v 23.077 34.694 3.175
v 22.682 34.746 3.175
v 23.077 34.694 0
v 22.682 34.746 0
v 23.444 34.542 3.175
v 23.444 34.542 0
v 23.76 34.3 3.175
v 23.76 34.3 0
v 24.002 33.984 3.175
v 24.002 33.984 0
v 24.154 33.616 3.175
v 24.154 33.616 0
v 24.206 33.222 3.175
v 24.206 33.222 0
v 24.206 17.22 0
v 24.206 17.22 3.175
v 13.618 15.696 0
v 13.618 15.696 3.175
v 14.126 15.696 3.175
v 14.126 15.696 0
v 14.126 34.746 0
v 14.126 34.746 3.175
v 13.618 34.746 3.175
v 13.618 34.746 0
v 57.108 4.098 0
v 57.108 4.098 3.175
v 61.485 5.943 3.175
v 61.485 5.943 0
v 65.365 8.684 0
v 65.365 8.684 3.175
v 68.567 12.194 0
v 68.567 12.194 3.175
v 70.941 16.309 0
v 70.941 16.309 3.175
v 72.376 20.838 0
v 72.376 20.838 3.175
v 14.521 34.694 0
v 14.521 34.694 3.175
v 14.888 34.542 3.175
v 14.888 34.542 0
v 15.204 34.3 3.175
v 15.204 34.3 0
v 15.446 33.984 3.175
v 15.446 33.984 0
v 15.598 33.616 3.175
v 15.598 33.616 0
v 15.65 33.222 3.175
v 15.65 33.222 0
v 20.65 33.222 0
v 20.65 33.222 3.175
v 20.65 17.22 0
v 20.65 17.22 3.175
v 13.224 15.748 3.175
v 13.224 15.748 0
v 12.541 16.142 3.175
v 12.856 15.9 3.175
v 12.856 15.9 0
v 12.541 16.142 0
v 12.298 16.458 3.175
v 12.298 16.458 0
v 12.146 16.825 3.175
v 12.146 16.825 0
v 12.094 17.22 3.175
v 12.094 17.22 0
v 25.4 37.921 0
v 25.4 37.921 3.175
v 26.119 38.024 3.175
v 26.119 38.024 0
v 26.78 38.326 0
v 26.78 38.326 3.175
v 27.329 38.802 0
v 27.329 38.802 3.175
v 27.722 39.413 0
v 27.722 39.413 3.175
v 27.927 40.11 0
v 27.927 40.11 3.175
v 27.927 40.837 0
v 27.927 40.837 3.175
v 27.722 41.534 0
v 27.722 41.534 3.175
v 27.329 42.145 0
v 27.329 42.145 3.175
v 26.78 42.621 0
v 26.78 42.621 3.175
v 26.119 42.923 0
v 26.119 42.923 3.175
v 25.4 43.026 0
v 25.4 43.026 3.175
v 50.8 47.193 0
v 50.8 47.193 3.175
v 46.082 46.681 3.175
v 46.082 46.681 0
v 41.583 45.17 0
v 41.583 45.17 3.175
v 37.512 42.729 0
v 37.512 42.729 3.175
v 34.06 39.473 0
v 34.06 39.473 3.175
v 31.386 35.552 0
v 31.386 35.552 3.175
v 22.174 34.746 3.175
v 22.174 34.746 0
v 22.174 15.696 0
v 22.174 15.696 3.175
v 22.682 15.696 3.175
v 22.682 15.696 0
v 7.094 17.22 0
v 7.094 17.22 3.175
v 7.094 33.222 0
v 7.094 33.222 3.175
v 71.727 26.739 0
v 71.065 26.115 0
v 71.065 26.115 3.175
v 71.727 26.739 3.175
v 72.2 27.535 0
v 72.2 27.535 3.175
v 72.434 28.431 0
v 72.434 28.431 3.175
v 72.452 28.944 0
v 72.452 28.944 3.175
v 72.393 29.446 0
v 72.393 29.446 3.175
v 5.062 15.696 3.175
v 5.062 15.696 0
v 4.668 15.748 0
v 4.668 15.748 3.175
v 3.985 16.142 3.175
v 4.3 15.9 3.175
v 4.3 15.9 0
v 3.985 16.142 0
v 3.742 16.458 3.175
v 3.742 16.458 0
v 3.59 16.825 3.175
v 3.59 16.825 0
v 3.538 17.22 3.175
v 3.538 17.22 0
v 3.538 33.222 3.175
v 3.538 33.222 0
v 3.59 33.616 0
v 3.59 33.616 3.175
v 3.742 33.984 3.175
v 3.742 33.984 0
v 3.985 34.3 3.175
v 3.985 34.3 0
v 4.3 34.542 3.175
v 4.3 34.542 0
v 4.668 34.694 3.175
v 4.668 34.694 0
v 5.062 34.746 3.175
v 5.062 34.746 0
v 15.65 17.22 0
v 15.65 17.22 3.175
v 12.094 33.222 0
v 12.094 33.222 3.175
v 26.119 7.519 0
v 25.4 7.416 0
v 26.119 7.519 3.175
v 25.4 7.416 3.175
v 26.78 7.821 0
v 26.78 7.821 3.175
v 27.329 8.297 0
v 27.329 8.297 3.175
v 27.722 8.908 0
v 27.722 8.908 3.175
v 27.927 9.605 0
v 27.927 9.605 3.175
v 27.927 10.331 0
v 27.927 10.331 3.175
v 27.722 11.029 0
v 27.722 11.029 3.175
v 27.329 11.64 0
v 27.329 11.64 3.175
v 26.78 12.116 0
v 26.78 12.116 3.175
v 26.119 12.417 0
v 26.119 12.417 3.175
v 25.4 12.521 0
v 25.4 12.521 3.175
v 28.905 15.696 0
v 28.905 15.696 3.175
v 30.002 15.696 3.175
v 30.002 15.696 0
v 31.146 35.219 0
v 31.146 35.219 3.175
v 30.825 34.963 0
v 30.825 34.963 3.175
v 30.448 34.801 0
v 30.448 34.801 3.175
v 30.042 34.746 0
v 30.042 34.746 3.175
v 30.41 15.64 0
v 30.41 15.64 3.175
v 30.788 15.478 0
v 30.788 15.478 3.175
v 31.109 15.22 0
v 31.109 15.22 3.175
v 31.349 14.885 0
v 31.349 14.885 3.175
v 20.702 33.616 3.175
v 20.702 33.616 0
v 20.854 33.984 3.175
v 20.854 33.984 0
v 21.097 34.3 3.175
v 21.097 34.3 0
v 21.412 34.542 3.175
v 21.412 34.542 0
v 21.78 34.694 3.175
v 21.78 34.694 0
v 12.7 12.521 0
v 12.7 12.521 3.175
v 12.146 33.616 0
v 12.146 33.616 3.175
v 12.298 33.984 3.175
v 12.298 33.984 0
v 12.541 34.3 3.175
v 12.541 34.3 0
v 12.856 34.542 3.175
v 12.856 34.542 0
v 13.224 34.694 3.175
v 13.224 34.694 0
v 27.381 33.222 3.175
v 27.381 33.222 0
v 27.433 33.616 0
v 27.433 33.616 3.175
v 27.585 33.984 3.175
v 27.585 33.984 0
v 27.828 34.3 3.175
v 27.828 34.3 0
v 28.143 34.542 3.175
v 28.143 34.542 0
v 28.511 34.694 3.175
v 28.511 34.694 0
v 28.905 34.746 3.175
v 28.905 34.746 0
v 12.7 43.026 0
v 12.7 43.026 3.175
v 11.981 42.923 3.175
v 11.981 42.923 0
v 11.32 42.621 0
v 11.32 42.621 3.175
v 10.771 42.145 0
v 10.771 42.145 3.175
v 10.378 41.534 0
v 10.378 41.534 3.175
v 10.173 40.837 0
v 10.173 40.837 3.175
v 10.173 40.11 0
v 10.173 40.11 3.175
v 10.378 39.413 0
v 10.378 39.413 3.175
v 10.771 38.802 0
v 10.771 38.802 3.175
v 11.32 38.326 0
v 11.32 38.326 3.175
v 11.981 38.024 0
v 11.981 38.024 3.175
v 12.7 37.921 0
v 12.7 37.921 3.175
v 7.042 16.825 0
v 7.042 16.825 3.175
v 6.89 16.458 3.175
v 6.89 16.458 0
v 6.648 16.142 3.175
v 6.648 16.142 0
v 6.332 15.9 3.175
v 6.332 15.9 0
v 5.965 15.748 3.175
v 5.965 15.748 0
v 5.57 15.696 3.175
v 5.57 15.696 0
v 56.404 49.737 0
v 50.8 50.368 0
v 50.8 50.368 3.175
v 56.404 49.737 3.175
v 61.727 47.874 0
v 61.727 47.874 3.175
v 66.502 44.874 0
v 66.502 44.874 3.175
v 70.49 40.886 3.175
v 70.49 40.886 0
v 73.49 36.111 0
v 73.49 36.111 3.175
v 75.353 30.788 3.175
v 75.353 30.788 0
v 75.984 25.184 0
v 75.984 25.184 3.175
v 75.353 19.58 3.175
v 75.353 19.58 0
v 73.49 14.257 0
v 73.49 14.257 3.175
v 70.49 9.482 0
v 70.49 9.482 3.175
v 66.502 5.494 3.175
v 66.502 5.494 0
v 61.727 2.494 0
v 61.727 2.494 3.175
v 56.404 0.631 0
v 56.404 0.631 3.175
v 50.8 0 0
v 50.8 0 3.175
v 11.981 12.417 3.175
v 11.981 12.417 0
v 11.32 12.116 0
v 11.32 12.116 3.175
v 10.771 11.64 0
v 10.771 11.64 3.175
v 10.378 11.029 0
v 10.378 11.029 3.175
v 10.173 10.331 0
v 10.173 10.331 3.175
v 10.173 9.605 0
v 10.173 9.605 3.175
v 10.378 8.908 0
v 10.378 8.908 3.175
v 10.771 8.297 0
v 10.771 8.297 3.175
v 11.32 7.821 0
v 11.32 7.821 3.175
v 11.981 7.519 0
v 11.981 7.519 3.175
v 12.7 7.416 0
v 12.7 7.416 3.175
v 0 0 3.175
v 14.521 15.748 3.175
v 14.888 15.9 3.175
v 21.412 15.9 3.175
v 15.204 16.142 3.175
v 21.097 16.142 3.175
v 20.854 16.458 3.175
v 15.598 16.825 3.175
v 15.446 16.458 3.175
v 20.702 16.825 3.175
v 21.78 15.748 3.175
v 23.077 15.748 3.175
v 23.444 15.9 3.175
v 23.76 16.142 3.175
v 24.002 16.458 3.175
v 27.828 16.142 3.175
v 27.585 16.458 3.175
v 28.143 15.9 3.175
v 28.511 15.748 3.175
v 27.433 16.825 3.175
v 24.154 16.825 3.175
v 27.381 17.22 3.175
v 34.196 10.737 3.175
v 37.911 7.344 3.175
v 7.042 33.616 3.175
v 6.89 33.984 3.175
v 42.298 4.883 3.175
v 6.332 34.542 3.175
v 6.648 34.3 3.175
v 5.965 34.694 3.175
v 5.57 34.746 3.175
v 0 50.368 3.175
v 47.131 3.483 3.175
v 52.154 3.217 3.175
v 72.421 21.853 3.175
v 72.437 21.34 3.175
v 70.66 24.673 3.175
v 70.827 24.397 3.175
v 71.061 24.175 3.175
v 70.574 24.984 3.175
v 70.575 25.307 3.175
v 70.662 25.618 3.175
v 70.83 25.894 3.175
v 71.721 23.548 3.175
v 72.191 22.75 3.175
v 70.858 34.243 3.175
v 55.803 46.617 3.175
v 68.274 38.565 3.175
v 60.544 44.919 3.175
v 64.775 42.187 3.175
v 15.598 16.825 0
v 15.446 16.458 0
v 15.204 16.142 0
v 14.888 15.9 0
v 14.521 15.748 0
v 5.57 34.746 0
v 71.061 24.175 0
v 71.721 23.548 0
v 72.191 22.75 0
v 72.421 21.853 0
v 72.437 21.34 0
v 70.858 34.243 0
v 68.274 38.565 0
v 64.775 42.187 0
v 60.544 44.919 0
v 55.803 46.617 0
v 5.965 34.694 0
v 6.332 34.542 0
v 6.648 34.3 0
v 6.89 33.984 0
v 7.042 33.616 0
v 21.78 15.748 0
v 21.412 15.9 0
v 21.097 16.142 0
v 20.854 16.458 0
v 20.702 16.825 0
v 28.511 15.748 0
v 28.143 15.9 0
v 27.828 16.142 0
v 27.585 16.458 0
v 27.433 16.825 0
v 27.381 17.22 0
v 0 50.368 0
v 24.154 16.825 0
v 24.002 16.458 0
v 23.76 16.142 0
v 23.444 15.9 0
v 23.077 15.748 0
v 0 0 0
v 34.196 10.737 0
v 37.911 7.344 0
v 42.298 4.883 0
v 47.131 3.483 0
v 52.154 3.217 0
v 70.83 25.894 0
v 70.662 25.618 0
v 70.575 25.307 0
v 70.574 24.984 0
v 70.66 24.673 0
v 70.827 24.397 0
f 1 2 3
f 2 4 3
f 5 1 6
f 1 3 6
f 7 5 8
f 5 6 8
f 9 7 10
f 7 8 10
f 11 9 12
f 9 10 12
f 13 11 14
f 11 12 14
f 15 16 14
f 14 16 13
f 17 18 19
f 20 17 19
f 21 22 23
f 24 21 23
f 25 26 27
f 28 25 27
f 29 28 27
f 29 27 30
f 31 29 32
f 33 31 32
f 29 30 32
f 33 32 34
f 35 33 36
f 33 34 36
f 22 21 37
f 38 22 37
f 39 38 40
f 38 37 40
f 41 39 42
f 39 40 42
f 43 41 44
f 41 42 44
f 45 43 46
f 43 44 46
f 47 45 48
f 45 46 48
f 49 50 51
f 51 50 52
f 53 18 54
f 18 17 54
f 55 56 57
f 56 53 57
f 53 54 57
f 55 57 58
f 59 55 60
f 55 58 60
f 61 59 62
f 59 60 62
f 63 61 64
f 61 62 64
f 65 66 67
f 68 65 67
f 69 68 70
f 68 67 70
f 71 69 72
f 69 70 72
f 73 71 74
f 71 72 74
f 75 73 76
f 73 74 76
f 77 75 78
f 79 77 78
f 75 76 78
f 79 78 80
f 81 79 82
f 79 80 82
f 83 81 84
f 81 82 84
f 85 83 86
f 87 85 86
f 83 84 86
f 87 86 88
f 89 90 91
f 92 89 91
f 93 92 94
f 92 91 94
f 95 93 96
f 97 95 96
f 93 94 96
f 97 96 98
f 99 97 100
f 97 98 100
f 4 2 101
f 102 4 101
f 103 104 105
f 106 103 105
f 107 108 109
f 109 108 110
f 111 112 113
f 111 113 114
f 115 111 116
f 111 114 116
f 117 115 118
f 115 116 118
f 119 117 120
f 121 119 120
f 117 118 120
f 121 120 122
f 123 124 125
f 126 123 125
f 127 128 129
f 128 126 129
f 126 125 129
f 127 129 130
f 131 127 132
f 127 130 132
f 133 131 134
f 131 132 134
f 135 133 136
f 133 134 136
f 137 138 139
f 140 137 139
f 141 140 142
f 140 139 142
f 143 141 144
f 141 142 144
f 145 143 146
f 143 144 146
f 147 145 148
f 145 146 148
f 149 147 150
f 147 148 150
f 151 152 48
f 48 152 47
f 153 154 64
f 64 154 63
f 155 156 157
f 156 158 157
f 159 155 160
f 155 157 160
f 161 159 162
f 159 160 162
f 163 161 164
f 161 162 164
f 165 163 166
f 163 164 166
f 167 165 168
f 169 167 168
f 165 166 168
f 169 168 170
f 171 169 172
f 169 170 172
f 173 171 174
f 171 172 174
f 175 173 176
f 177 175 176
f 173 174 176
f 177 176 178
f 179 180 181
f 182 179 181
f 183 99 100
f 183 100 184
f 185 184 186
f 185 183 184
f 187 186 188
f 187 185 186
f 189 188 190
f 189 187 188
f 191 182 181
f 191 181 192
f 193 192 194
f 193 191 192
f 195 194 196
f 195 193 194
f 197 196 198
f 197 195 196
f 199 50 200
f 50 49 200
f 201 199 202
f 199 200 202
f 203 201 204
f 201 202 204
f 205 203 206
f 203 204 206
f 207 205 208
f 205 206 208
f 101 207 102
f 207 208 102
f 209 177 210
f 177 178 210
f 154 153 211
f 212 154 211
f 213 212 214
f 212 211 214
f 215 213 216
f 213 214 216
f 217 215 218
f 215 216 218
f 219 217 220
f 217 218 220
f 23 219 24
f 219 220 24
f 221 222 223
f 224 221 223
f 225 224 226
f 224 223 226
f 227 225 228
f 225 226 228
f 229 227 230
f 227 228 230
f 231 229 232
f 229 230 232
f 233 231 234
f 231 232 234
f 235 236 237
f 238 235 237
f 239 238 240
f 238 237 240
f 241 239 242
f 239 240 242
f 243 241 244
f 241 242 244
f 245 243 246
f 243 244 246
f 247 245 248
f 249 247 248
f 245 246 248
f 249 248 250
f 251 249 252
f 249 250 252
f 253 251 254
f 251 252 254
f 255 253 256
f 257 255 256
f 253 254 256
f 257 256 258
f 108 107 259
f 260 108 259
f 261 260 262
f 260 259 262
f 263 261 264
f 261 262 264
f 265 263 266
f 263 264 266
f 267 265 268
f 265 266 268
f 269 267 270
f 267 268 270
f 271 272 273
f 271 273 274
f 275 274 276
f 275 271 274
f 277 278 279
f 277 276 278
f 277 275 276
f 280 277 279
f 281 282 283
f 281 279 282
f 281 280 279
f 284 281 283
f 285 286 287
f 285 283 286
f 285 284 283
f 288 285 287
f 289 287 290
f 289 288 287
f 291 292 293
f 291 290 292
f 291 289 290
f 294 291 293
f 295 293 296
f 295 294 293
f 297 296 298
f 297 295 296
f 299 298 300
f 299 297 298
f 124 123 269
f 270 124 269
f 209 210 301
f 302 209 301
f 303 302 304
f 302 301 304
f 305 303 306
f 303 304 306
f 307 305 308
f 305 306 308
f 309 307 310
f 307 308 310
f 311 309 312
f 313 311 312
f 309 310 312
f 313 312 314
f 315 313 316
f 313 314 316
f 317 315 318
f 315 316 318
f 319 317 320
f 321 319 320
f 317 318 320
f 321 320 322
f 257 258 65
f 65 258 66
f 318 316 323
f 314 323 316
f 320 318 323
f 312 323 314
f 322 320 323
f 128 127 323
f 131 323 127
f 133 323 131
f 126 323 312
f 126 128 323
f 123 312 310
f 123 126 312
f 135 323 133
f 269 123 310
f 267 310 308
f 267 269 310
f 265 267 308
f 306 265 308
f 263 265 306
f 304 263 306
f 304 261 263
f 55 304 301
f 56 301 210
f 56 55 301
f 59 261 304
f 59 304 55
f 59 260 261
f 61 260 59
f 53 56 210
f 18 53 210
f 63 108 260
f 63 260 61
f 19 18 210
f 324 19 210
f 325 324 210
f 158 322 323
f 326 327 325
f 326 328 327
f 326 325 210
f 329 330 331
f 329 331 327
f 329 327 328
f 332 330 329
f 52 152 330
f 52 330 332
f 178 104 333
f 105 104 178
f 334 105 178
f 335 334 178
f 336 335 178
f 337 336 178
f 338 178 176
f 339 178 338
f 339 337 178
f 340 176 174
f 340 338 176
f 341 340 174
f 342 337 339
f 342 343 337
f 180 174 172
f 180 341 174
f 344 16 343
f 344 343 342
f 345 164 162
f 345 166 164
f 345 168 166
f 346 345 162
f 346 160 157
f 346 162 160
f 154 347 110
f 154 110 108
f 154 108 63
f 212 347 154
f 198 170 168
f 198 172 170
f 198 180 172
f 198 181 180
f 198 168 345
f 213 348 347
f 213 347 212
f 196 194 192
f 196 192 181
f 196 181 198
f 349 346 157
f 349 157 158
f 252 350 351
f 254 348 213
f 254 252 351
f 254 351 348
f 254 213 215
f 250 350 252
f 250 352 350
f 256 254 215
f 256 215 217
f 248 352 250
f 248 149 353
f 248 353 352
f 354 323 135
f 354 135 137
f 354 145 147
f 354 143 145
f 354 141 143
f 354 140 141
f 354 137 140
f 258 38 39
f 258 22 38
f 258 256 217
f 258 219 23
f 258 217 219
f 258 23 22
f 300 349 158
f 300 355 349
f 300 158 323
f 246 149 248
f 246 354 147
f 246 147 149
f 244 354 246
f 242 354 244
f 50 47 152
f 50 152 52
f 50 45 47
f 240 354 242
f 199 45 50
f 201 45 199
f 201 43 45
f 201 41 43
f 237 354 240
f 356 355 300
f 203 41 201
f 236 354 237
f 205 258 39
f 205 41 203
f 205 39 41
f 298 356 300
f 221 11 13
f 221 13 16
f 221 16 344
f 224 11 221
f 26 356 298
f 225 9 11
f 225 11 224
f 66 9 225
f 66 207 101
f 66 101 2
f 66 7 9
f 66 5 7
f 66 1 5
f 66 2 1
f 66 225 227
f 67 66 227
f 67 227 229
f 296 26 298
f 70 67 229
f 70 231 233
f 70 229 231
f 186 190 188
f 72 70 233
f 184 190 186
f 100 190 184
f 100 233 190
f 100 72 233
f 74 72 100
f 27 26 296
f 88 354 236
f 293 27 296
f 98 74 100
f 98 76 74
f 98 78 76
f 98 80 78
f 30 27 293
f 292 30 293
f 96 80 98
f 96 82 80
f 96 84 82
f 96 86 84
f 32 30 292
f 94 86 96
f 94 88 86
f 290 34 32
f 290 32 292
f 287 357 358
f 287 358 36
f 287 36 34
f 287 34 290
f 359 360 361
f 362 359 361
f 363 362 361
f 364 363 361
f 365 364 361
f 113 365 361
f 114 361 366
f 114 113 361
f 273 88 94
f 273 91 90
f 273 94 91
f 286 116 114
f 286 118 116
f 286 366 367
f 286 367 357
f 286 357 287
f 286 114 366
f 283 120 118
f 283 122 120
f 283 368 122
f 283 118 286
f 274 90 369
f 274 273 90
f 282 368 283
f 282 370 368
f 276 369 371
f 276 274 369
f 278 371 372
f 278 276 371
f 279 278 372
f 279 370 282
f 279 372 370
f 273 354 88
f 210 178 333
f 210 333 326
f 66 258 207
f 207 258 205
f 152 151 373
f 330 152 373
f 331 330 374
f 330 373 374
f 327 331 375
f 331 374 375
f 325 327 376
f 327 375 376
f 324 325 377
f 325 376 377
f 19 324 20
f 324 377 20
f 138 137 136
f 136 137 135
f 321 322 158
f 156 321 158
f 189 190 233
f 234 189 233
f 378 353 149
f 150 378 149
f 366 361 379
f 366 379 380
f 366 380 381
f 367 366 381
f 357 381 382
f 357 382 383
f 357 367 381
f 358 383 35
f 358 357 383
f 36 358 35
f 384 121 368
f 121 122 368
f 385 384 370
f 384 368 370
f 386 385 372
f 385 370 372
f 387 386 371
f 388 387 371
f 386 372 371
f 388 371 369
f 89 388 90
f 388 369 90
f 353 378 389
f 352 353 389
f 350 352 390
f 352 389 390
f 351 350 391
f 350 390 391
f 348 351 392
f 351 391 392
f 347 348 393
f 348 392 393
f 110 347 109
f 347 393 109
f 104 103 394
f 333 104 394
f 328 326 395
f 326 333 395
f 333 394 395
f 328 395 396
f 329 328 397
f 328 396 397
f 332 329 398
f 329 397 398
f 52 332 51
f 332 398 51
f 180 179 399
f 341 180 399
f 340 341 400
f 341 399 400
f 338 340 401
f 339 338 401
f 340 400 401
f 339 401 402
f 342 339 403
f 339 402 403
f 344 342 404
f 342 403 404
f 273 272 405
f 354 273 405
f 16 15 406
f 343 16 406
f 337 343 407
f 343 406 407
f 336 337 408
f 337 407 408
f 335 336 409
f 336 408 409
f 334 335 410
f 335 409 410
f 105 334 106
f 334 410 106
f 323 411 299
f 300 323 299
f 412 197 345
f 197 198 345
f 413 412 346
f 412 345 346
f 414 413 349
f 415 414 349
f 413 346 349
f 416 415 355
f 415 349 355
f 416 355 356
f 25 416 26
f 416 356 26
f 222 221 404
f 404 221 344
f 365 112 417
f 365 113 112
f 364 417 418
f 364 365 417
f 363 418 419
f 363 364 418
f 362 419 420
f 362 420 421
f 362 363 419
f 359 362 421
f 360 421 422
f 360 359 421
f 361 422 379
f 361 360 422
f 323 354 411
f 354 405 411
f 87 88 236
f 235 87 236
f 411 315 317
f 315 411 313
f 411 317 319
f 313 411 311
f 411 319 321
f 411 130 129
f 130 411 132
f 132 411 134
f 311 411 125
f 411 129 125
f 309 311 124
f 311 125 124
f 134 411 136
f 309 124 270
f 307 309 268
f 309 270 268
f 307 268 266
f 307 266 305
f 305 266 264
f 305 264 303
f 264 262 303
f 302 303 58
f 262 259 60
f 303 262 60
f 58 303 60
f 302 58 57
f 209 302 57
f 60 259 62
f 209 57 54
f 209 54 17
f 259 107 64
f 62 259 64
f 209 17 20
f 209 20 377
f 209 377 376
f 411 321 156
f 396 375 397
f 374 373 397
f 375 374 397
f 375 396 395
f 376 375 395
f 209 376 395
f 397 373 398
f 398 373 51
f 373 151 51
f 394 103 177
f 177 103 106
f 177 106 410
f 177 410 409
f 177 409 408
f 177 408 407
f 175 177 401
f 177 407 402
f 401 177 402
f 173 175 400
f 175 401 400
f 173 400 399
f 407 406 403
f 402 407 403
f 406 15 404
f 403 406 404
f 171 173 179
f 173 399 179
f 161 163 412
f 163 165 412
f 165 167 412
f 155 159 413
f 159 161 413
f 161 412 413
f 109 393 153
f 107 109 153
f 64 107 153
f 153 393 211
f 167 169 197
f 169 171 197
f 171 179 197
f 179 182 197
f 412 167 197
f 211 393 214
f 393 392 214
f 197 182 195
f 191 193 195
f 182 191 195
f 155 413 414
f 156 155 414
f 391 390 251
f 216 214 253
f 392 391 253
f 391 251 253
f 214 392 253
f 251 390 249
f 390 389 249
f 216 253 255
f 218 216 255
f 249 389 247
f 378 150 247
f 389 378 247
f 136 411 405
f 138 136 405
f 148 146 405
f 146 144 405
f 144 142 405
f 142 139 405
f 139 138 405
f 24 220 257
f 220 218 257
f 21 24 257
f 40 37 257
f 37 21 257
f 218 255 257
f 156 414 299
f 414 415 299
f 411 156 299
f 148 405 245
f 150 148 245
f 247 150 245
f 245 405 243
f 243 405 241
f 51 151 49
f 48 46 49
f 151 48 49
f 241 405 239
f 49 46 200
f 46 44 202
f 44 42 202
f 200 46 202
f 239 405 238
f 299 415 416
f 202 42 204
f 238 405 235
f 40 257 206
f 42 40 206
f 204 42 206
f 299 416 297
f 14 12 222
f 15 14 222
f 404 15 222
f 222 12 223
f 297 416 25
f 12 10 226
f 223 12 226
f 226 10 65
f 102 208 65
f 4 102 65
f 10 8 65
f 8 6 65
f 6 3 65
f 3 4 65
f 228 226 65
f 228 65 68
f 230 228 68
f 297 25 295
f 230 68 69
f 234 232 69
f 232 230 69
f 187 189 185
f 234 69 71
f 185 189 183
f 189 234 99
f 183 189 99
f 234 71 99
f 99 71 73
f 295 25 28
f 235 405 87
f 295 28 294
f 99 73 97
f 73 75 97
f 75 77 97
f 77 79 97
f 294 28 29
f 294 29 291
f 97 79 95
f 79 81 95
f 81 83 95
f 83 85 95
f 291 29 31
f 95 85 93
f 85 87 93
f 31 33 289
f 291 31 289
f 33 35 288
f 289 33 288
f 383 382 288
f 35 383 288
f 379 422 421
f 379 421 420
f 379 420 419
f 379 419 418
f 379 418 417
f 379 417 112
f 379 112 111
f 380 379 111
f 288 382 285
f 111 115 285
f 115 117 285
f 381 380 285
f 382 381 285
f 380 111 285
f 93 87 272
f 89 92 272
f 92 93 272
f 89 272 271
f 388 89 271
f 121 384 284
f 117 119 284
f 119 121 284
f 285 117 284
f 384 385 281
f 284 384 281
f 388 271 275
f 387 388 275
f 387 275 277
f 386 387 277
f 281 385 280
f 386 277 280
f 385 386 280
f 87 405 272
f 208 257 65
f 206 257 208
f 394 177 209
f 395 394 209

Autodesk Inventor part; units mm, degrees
ref_plane "YZ Plane" through (0, 0, 0) normal (1, 0, 0) x (0, 1, 0)
ref_plane "XZ Plane" through (0, 0, 0) normal (0, 1, 0) x (-1, 0, 0)
ref_plane "XY Plane" through (0, 0, 0) normal (0, 0, 1) x (1, 0, 0)
sketch "Sketch1" plane through (0, 0, 0) normal (0, 0, 1) x (1, 0, 0)
  line L0 (0, 0) -> (50.8, 0) construction
  line L1 (50.8, 0) -> (50.8, 50.3682) construction
  line L2 (50.8, 50.3682) -> (0, 50.3682) construction
  line L3 (0, 50.3682) -> (0, 0) construction
  circle A0 centre (50.8, 25.1841) radius 25.1841 construction
  line L4 (0, 0) -> (50.8, 0)
  line L5 (50.8, 0) -> (50.8, 50.3682) construction
  line L6 (50.8, 50.3682) -> (0, 50.3682)
  line L7 (0, 50.3682) -> (0, 0)
  arc A1 (50.8, 0) -> (50.8, 50.3682) centre (50.8, 25.1841) ccw
  dimension "d0" = 50.8
  dimension "d1" = 50.3682
extrude "Extrusion1" add sketch "Sketch1" along normal blind 3.175
sketch "Sketch2" plane through (0, 0, 3.175) normal (0, 0, 1) x (1, 0, 0)
  arc A0 (50.8, 0) -> (50.8, 50.3682) centre (50.8, 25.1841) ccw projected
  arc A1 (57.1075, 4.0982) -> (50.8, 47.1932) centre (50.8, 25.1841) ccw
  line L0 (27.3812, 15.6959) -> (33.7312, 15.6959)
  line L1 (33.7312, 15.6959) -> (33.7312, 34.7459)
  line L2 (33.7312, 34.7459) -> (27.3812, 34.7459)
  line L3 (27.3812, 34.7459) -> (27.3812, 15.6959)
  line L4 (27.3812, 15.6959) -> (33.7312, 34.7459) construction
  line L5 (33.7312, 15.6959) -> (27.3812, 34.7459) construction
  arc A2 (50.8, 47.1932) -> (30.9765, 34.7459) centre (50.8, 25.1841) ccw
  arc A3 (30.9411, 15.6959) -> (57.1075, 4.0982) centre (50.8, 25.1841) ccw
  line L6 (0, 50.3682) -> (0, 0) projected
  line L7 (50.8, 50.3682) -> (0, 50.3682) projected
  point P0 (30.5562, 25.2209)
  dimension "d6" = 3.175
  dimension "d7" = 6.35
  dimension "d8" = 19.05
  dimension "d9" = 12.4473
  dimension "d10" = 27.3812
  dimension "d11" = 15.6223
extrude "Extrusion2" cut sketch "Sketch2" against normal blind 3.175
sketch "Sketch3" plane through (0, 0, 3.175) normal (0, 0, 1) x (1, 0, 0)
  circle A0 centre (71.755, 25.1433) radius 1.1913
  line L0 (30.9411, 15.6959) -> (27.3812, 15.6959) projected
  line L1 (27.3812, 15.6959) -> (27.3812, 34.7459) projected
  line L2 (27.3812, 34.7459) -> (30.9765, 34.7459) projected
  arc A1 (30.9411, 15.6959) -> (30.9765, 34.7459) centre (50.8, 25.1841) ccw projected
  arc A2 (50.8, 0) -> (50.8, 50.3682) centre (50.8, 25.1841) ccw projected
  line L3 (50.8, 50.3682) -> (0, 50.3682) projected
  line L4 (0, 50.3682) -> (0, 0) projected
  line L5 (0, 0) -> (50.8, 0) projected
  point P0 (72.8091, 25.1433)
  point P1 (72.8006, 24.5725)
  point P2 (72.8028, 25.71)
  dimension "d14" = 2.3825
  dimension "d15" = 20.955
extrude "Extrusion3" add sketch "Sketch3" against normal up to surface (3.175 mm away) contours A1 A0 picked at (72.0601, 25.1427)
fillet "Fillet1" radius 3.302 2 edges at (72.8006, 24.5725, 1.5875) (72.8028, 25.71, 1.5875)
sketch "Sketch4" plane through (0, 0, 3.175) normal (0, 0, 1) x (1, 0, 0)
  line L0 (24.2062, 34.7459) -> (20.6502, 34.7459)
  line L1 (20.6502, 34.7459) -> (20.6502, 15.6959)
  line L2 (20.6502, 15.6959) -> (24.2062, 15.6959)
  line L3 (24.2062, 15.6959) -> (24.2062, 34.7459)
  line L4 (24.2062, 34.7459) -> (20.6502, 15.6959) construction
  line L5 (20.6502, 34.7459) -> (24.2062, 15.6959) construction
  line L6 (15.6502, 34.7459) -> (12.0942, 34.7459)
  line L7 (12.0942, 34.7459) -> (12.0942, 15.6959)
  line L8 (12.0942, 15.6959) -> (15.6502, 15.6959)
  line L9 (15.6502, 15.6959) -> (15.6502, 34.7459)
  line L10 (15.6502, 34.7459) -> (12.0942, 15.6959) construction
  line L11 (12.0942, 34.7459) -> (15.6502, 15.6959) construction
  line L12 (7.0942, 34.7459) -> (3.5382, 34.7459)
  line L13 (3.5382, 34.7459) -> (3.5382, 15.6959)
  line L14 (3.5382, 15.6959) -> (7.0942, 15.6959)
  line L15 (7.0942, 15.6959) -> (7.0942, 34.7459)
  line L16 (7.0942, 34.7459) -> (3.5382, 15.6959) construction
  line L17 (3.5382, 34.7459) -> (7.0942, 15.6959) construction
  line L18 (27.3812, 15.6959) -> (27.3812, 34.7459) projected
  line L19 (0, 50.3682) -> (0, 0) projected
  line L20 (27.3812, 34.7459) -> (30.9765, 34.7459) projected
  line L21 (27.9527, 9.9682) -> (10.1473, 9.9682) construction
  line L22 (25.4, 12.5209) -> (12.7, 12.5209)
  line L23 (12.7, 7.4155) -> (25.4, 7.4155)
  arc A0 (25.4, 7.4155) -> (25.4, 12.5209) centre (25.4, 9.9682) ccw
  arc A1 (12.7, 12.5209) -> (12.7, 7.4155) centre (12.7, 9.9682) ccw
  line L24 (27.9527, 40.4736) -> (10.1473, 40.4736) construction
  line L25 (25.4, 43.0263) -> (12.7, 43.0263)
  line L26 (12.7, 37.9209) -> (25.4, 37.9209)
  arc A2 (25.4, 37.9209) -> (25.4, 43.0263) centre (25.4, 40.4736) ccw
  arc A3 (12.7, 43.0263) -> (12.7, 37.9209) centre (12.7, 40.4736) ccw
  line L27 (30.9411, 15.6959) -> (27.3812, 15.6959) projected
  point P0 (22.4282, 25.2209)
  point P1 (13.8722, 25.2209)
  point P2 (5.3162, 25.2209)
  point P3 (27.3812, 25.2209)
  point P4 (19.05, 9.9682)
  point P5 (19.05, 40.4736)
  point P6 (27.9527, 40.4736)
  point P7 (12.0942, 25.2209)
  dimension "d19" = 3.175
  dimension "d20" = 5
  dimension "d21" = 5
  dimension "d22" = 3.556
  dimension "d23" = 3.556
  dimension "d24" = 3.556
  dimension "d25" = 19.05
  dimension "d26" = 19.05
  dimension "d27" = 19.05
  dimension "d28" = 3.5382
  dimension "d29" = 5.1054
  dimension "d30" = 5.1054
  dimension "d33" = 12.7
  dimension "d34" = 12.7
  dimension "d35" = 3.175
  dimension "d36" = 3.175
  dimension "d37" = 19.05
extrude "Extrusion4" cut sketch "Sketch4" against normal blind 25.4
fillet "Fillet2" radius 1.524 16 edges at (3.5382, 34.7459, 1.5875) (7.0942, 34.7459, 1.5875) (3.5382, 15.6959, 1.5875) (7.0942, 15.6959, 1.5875) (12.0942, 34.7459, 1.5875) (15.6502, 34.7459, 1.5875) (15.6502, 15.6959, 1.5875) (12.0942, 15.6959, 1.5875) (24.2062, 34.7459, 1.5875) (20.6502, 34.7459, 1.5875) (20.6502, 15.6959, 1.5875) (24.2062, 15.6959, 1.5875) (27.3812, 34.7459, 1.5875) (27.3812, 15.6959, 1.5875) (30.9411, 15.6959, 1.5875) (30.9765, 34.7459, 1.5875)
equation "\"d22\" = d23"
equation "\"d24\" = d23"
equation "\"d26\" = d25"
equation "\"d27\" = d25"
equation "\"d34\" = d33"
equation "\"d36\" = d35"
properties part number "EL2-009" material "Aluminum 6061"
